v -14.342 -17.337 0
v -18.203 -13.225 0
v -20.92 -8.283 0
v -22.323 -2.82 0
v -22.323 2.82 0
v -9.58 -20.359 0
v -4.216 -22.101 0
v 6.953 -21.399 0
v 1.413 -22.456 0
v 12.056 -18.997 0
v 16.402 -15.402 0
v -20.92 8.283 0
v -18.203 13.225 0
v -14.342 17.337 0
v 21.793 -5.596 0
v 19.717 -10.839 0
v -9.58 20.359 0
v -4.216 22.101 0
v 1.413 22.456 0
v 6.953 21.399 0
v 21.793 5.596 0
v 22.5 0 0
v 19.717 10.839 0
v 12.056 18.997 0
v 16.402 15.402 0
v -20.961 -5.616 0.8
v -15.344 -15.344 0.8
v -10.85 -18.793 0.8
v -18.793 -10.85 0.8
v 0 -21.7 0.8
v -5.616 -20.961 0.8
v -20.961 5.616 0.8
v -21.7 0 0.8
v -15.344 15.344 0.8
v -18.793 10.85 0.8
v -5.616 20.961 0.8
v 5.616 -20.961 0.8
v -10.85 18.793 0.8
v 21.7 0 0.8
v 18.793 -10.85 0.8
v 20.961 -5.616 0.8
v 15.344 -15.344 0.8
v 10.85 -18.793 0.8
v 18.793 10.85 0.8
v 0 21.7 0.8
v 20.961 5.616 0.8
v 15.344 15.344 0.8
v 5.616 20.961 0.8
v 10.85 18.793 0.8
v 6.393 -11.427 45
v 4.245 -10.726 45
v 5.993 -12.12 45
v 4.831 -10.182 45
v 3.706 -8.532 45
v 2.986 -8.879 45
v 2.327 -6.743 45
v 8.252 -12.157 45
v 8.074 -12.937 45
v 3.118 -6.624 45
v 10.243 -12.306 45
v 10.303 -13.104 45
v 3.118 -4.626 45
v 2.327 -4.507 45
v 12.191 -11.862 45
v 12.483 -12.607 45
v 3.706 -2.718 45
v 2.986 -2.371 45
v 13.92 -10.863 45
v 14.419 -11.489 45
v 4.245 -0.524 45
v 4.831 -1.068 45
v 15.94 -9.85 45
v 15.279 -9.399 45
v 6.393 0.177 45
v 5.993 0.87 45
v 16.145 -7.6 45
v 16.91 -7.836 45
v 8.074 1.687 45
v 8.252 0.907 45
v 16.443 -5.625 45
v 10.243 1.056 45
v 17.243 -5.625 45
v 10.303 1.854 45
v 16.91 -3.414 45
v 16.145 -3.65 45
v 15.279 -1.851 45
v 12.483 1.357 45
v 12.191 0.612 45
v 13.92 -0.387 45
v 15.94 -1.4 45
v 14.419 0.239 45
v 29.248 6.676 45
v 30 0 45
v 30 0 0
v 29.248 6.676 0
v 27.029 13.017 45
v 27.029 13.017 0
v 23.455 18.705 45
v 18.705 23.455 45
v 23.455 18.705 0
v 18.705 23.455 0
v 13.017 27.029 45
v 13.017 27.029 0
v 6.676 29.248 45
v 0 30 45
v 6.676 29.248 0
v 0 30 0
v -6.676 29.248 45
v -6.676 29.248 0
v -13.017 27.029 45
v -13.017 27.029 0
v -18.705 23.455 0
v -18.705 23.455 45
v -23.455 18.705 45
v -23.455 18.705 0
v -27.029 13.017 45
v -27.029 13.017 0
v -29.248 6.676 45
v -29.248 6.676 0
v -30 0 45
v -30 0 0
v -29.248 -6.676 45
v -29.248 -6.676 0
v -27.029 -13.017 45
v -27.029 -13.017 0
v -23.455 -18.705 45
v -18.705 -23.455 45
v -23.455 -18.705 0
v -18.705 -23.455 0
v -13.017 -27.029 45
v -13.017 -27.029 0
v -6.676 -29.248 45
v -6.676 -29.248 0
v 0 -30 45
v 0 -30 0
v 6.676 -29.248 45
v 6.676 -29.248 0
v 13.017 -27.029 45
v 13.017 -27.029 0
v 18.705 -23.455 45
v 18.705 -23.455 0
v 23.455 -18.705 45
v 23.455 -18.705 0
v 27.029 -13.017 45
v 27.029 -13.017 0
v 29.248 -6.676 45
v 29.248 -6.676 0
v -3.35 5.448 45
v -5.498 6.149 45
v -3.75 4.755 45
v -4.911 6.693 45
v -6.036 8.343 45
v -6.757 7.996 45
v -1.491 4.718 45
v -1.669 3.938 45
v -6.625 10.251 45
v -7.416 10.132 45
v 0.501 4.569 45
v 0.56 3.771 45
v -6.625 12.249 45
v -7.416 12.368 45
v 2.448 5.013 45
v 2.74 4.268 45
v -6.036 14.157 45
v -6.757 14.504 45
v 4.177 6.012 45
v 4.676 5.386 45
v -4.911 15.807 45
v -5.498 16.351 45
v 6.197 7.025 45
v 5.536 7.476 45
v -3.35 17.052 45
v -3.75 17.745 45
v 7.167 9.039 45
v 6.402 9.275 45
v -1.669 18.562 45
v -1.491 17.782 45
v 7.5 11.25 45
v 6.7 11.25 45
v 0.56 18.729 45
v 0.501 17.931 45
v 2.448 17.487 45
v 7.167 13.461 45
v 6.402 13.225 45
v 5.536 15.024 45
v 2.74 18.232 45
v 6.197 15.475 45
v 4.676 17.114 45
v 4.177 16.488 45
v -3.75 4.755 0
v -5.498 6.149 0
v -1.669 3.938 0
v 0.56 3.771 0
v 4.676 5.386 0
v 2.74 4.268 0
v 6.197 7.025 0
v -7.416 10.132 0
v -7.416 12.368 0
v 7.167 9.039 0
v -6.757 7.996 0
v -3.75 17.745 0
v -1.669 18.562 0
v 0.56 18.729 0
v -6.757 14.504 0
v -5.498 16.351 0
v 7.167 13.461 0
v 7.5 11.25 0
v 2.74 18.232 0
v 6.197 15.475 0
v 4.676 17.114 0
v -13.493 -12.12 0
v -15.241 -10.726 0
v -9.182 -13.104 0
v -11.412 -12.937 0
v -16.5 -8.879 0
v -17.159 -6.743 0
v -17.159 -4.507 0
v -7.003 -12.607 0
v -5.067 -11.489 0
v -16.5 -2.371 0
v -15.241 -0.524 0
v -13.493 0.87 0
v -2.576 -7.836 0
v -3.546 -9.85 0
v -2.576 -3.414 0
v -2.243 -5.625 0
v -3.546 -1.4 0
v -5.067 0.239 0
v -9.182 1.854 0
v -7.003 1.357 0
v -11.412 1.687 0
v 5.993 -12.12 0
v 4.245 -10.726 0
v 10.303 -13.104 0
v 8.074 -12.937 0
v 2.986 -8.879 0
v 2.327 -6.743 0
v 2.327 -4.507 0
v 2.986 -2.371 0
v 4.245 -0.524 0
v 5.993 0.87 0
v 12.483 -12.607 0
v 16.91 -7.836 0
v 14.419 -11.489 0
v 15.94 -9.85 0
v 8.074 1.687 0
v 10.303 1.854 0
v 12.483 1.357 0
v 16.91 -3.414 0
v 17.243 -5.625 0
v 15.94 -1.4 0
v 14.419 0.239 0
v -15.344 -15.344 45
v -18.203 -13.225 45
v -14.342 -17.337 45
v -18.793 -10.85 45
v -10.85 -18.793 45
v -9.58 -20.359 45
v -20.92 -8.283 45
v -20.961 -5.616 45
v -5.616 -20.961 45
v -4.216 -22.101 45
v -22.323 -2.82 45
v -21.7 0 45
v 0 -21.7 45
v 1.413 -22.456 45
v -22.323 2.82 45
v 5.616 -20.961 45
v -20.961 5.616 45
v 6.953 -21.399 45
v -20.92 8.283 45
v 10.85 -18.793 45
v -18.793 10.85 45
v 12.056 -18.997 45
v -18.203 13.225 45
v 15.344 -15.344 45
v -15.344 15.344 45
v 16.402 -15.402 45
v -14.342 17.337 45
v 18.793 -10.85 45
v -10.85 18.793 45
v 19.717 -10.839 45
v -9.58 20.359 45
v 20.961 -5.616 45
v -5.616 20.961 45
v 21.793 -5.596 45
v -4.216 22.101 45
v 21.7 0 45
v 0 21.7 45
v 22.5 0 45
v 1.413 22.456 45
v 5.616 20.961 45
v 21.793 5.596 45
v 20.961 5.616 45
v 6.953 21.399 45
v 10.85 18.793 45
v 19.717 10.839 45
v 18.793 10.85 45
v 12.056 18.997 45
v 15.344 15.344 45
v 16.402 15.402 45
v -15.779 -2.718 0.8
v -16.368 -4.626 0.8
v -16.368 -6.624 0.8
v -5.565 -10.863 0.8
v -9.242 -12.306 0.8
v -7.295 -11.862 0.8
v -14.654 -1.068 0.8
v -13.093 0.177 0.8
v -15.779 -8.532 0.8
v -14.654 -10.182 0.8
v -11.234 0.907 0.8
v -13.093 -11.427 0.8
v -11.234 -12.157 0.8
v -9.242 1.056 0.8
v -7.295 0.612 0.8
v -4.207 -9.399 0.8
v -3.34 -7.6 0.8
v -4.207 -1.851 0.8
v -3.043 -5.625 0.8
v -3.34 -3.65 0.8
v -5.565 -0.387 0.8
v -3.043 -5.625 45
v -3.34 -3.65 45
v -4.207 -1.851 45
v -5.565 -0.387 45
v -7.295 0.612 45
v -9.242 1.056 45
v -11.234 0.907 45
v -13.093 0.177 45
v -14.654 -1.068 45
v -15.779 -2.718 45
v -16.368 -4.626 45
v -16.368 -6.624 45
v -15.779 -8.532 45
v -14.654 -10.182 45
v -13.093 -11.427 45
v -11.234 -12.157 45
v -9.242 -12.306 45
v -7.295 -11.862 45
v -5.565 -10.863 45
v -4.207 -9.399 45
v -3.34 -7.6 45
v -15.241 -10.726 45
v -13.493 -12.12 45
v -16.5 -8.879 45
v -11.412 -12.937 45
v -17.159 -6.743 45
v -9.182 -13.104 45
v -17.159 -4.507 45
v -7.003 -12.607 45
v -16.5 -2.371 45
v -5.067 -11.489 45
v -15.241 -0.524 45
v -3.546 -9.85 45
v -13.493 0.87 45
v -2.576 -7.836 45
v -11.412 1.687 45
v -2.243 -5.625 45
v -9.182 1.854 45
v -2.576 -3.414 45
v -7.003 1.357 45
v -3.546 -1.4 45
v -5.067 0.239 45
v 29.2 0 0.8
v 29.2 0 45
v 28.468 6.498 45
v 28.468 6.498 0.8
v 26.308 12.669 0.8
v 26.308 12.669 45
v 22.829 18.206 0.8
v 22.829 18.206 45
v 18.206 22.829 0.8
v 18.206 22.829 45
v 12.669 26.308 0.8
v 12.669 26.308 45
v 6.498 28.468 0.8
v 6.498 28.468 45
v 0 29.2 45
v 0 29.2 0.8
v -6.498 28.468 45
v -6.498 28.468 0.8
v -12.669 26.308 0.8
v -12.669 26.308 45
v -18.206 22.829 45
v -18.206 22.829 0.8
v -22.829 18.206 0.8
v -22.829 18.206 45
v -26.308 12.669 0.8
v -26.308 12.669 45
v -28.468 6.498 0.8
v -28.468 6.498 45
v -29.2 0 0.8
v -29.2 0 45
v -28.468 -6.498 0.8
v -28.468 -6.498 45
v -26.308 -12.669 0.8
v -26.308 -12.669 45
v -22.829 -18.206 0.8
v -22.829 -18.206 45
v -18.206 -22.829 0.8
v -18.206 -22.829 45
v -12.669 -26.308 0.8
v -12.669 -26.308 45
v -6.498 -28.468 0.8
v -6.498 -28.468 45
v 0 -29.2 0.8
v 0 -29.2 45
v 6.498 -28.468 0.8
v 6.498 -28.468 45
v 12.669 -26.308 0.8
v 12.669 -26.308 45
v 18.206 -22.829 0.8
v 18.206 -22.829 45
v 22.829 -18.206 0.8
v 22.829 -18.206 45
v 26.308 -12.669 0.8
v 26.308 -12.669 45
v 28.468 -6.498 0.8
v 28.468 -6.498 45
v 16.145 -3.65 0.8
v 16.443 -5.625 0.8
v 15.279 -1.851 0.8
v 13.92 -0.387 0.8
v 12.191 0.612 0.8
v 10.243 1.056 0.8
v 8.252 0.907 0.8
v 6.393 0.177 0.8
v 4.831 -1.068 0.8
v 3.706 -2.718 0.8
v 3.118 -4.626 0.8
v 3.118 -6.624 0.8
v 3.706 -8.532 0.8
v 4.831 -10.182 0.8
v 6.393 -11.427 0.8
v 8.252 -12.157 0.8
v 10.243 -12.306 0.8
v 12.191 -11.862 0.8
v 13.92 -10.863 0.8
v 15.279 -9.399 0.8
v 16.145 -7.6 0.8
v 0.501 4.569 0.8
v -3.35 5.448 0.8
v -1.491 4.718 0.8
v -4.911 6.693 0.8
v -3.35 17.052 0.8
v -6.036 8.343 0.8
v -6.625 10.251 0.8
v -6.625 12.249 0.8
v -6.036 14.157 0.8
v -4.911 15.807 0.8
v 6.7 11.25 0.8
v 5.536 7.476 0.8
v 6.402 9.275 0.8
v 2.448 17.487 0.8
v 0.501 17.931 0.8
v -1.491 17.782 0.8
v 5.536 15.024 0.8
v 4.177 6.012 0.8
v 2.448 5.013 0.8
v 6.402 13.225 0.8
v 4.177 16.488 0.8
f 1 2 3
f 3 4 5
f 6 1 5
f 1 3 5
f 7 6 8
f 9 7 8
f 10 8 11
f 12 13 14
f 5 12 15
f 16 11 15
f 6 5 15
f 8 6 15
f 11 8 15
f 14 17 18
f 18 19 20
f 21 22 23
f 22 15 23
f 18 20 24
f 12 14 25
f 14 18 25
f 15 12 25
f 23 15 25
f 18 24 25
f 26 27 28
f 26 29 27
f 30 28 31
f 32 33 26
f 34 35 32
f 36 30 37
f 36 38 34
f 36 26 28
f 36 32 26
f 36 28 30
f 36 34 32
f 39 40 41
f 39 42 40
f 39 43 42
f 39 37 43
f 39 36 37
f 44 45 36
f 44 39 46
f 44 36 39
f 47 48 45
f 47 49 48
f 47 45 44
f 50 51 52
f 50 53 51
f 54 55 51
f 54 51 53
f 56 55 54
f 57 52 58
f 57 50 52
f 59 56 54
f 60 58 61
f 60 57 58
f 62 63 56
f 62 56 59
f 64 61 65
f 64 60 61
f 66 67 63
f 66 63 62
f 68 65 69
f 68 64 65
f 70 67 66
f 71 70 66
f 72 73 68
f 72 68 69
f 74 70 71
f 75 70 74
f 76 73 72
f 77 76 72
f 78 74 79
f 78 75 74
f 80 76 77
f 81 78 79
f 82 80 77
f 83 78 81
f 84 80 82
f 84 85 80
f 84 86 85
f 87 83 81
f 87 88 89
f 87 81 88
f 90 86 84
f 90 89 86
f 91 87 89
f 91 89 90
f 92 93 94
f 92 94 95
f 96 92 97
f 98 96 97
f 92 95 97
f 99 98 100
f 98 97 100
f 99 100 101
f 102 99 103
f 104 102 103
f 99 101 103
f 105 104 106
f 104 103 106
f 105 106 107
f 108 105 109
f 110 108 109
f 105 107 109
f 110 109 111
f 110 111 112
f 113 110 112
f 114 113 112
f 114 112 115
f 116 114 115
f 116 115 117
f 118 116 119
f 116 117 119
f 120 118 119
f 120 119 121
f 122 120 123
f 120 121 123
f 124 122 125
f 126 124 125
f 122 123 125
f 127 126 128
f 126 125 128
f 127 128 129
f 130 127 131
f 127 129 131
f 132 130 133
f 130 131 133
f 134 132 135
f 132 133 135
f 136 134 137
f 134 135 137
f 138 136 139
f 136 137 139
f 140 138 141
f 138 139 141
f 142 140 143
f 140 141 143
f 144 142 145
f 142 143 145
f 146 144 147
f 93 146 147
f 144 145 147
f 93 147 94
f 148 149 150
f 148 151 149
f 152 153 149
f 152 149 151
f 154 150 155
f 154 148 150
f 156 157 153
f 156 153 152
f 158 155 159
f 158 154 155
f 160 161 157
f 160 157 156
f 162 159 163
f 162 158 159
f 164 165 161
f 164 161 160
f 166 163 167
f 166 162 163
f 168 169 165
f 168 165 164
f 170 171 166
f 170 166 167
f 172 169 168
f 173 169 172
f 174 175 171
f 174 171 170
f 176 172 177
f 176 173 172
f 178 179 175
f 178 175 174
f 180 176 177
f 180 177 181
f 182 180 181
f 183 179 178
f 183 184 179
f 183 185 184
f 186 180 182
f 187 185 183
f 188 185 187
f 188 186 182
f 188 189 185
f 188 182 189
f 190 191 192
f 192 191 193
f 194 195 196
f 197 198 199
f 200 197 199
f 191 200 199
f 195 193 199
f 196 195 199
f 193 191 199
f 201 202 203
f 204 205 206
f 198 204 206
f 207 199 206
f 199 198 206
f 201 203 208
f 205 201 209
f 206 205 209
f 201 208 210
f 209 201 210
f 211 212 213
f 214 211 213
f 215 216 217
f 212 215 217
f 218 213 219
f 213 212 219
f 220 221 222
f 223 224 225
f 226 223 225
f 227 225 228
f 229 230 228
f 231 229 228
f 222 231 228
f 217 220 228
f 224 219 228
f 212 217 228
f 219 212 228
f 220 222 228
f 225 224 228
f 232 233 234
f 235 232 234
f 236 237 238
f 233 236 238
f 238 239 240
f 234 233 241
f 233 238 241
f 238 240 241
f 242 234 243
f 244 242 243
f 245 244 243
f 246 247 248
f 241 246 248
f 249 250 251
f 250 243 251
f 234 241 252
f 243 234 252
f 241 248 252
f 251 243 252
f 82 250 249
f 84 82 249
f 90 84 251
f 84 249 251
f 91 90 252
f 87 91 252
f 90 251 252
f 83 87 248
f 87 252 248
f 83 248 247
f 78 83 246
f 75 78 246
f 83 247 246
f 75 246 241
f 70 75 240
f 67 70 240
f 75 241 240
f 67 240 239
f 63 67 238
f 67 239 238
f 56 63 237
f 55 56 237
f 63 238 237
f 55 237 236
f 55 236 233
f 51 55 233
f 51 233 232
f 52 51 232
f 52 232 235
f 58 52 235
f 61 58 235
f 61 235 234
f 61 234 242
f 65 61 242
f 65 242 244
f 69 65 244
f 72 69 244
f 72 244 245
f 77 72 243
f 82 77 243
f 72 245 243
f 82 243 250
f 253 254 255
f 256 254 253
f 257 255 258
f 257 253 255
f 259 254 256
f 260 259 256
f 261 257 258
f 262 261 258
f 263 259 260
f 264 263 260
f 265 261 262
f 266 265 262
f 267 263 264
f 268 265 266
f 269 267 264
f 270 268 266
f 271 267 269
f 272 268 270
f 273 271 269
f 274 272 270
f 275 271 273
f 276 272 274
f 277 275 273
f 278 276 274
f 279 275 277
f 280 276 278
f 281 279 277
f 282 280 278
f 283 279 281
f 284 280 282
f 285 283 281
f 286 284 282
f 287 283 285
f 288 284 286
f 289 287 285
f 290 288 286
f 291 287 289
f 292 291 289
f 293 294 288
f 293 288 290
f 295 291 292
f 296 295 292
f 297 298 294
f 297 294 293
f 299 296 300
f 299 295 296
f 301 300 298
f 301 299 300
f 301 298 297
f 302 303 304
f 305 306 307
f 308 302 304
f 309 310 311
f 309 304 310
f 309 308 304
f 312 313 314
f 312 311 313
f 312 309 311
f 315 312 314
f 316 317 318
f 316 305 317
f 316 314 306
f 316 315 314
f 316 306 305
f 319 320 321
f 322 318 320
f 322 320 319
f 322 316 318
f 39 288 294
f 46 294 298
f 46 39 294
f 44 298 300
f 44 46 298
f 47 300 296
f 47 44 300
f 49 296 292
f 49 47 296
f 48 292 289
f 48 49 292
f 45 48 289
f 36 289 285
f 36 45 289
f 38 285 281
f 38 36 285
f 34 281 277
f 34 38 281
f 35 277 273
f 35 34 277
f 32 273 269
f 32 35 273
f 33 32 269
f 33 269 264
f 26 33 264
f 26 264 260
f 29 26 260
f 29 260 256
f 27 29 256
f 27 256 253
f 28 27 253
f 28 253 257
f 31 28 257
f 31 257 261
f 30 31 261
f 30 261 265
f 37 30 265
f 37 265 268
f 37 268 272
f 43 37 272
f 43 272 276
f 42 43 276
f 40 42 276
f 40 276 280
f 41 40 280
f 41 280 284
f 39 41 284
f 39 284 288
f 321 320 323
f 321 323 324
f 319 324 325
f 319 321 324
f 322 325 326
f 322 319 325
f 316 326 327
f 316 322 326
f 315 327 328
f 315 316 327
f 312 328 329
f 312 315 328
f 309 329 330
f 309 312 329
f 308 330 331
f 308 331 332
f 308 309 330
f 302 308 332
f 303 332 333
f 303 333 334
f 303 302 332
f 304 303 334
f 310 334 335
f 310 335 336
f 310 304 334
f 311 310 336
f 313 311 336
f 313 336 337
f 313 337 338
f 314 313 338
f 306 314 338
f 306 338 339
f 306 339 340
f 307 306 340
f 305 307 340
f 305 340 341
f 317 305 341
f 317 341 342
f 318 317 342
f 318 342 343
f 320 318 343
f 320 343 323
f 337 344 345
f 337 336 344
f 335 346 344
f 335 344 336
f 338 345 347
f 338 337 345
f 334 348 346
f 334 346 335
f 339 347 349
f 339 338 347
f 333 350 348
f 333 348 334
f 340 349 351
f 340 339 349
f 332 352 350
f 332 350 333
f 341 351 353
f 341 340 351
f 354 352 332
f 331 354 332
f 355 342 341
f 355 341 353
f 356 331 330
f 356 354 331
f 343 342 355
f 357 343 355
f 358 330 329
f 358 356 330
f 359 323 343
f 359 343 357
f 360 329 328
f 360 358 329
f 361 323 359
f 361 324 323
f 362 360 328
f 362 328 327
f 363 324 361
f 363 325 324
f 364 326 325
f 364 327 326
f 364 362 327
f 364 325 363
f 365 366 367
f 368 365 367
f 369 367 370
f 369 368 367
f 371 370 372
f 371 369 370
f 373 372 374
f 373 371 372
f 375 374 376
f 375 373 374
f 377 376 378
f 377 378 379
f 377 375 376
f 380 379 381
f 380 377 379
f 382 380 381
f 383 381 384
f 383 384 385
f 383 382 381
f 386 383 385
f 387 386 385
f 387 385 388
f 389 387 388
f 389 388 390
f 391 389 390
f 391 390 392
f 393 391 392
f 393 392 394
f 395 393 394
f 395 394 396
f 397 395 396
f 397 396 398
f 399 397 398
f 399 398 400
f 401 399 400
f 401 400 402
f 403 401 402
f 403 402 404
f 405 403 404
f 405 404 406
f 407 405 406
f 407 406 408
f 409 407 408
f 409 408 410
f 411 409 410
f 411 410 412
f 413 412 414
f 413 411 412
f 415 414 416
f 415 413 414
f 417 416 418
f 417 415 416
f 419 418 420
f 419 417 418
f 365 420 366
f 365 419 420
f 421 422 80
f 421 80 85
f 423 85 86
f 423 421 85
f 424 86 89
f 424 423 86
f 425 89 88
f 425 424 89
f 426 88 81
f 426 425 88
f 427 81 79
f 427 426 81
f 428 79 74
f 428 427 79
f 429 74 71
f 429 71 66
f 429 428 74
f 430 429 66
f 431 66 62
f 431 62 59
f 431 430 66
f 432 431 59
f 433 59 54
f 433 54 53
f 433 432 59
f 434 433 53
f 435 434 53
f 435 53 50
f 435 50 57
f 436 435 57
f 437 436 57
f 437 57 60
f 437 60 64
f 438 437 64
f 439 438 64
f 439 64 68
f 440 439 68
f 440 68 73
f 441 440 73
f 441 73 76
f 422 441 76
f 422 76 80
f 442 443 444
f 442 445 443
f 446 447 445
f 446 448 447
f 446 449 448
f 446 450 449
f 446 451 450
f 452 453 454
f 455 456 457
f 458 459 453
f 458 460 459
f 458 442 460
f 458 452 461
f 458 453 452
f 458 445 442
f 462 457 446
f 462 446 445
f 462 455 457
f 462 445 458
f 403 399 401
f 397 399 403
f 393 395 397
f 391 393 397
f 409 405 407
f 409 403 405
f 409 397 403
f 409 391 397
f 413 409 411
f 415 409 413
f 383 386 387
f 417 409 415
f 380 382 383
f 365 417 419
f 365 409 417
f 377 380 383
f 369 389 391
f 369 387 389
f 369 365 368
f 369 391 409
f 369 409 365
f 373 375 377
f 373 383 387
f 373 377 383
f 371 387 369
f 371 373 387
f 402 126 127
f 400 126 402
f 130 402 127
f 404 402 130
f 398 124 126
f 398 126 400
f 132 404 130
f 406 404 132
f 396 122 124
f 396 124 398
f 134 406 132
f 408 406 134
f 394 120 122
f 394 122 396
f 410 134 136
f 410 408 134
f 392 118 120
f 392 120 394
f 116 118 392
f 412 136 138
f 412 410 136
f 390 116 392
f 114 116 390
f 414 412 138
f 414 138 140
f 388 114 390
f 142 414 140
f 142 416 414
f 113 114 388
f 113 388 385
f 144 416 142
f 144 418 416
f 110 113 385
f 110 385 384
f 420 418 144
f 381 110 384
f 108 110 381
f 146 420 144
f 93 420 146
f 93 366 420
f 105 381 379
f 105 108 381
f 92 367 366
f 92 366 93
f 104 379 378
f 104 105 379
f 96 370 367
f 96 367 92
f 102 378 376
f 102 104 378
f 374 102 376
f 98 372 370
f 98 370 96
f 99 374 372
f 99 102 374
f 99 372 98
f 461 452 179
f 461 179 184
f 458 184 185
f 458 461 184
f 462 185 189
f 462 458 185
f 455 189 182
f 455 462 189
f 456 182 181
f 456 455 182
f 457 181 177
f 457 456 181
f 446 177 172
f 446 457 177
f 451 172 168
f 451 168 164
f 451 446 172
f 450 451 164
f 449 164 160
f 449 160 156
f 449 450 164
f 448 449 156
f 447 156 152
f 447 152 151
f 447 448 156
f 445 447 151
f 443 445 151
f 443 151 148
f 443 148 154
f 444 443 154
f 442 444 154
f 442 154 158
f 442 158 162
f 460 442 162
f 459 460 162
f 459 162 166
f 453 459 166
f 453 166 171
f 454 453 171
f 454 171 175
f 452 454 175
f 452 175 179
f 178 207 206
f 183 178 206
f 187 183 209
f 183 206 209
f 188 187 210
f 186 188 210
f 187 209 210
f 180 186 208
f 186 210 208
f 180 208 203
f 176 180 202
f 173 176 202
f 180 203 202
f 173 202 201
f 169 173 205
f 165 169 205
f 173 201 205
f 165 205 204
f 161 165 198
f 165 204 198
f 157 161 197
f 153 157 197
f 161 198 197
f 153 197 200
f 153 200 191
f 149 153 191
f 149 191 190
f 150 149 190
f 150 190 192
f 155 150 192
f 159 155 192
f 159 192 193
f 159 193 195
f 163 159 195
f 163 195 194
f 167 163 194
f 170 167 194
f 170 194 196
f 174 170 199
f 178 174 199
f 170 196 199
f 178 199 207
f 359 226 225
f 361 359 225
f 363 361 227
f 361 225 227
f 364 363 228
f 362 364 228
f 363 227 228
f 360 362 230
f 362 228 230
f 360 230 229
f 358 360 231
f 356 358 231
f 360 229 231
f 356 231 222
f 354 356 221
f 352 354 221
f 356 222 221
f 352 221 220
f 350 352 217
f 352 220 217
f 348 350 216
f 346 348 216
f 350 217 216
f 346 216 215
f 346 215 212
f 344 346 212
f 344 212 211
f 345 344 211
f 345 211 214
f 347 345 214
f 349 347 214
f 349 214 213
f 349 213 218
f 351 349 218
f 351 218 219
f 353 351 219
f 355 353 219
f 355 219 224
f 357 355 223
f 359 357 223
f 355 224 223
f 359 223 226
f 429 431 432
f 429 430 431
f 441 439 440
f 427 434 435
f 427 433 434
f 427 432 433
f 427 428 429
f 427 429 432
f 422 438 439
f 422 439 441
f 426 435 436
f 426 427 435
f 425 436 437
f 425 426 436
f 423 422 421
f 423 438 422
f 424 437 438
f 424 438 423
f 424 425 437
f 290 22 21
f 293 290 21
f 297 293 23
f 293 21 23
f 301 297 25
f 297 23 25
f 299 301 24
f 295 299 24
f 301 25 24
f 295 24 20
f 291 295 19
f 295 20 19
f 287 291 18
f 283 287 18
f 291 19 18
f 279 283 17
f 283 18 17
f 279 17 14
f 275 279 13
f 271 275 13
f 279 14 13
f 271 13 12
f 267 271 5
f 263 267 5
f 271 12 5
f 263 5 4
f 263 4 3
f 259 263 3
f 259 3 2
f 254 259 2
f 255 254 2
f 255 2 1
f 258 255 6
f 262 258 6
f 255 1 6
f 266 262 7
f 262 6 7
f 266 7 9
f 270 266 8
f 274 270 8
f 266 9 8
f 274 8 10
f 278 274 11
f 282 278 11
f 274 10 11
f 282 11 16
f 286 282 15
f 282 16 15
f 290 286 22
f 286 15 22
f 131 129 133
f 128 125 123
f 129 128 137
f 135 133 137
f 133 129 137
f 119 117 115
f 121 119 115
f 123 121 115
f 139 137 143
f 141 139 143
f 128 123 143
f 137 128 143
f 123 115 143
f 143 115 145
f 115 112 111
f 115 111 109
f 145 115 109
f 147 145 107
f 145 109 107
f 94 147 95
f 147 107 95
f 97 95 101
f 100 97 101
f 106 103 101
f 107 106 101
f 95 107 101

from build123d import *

# Parameters (mm, degrees)
F0_R     = 7.5
F1_DEPTH = 45
F0_R_2   = 22.5
F2_DEPTH = 45
F0_R_3   = 30
F3_DEPTH = 45
F4_T     = -0.8
F5_T     = -0.8
F6_T     = -0.8
F7_T     = -0.8
F8_T     = -0.8


with BuildPart() as f1:
    # F0 (on Top) → F1 (new body)
    with BuildSketch(Plane.XY):
        with Locations((0, 11.25)):
            Circle(F0_R)
    extrude(amount=F1_DEPTH)

    # F7
    f7_openings = [f1.faces().sort_by_distance(p)[0] for p in [
        (0, 11.25, 45),
    ]]
    offset(amount=F7_T, openings=f7_openings)


with BuildPart() as f1b:
    # F0 (on Top) → F1, piece 2 (new body)
    with BuildSketch(Plane.XY):
        with Locations((9.7427857926, -5.625)):
            Circle(F0_R)
    extrude(amount=F1_DEPTH)

    # F8
    f8_openings = [f1b.faces().sort_by_distance(p)[0] for p in [
        (9.742786, -5.625, 45),
    ]]
    offset(amount=F8_T, openings=f8_openings)


with BuildPart() as f1c:
    # F0 (on Top) → F1, piece 3 (new body)
    with BuildSketch(Plane.XY):
        with Locations((-9.7427857926, -5.625)):
            Circle(F0_R)
    extrude(amount=F1_DEPTH)

    # F6
    f6_openings = [f1c.faces().sort_by_distance(p)[0] for p in [
        (-9.742786, -5.625, 45),
    ]]
    offset(amount=F6_T, openings=f6_openings)


with BuildPart() as f2:
    # F0 (on Top) → F2 (new body)
    with BuildSketch(Plane.XY):
        Circle(F0_R_2)
        with Locations((-9.7427857926, -5.625)):
            Circle(F0_R, mode=Mode.SUBTRACT)
        with Locations((9.7427857926, -5.625)):
            Circle(F0_R, mode=Mode.SUBTRACT)
        with Locations((0, 11.25)):
            Circle(F0_R, mode=Mode.SUBTRACT)
        with Locations((-9.7427857926, -5.625)):
            Circle(F0_R)
        with Locations((0, 11.25)):
            Circle(F0_R)
        with Locations((9.7427857926, -5.625)):
            Circle(F0_R)
    extrude(amount=F2_DEPTH)

    # F5
    f5_openings = [f2.faces().sort_by_distance(p)[0] for p in [
        (0, 0, 45),
    ]]
    offset(amount=F5_T, openings=f5_openings)


with BuildPart() as f3:
    # F0 (on Top) → F3 (new body)
    with BuildSketch(Plane.XY):
        Circle(F0_R_3)
        Circle(F0_R_2, mode=Mode.SUBTRACT)
        Circle(F0_R_2)
        with Locations((-9.7427857926, -5.625)):
            Circle(F0_R, mode=Mode.SUBTRACT)
        with Locations((9.7427857926, -5.625)):
            Circle(F0_R, mode=Mode.SUBTRACT)
        with Locations((0, 11.25)):
            Circle(F0_R, mode=Mode.SUBTRACT)
        with Locations((-9.7427857926, -5.625)):
            Circle(F0_R)
        with Locations((0, 11.25)):
            Circle(F0_R)
        with Locations((9.7427857926, -5.625)):
            Circle(F0_R)
    extrude(amount=F3_DEPTH)

    # F4
    f4_openings = [f3.faces().sort_by_distance(p)[0] for p in [
        (0, 0, 45),
    ]]
    offset(amount=F4_T, openings=f4_openings)


solid = Compound([f1.part, f1b.part, f1c.part, f2.part, f3.part])
